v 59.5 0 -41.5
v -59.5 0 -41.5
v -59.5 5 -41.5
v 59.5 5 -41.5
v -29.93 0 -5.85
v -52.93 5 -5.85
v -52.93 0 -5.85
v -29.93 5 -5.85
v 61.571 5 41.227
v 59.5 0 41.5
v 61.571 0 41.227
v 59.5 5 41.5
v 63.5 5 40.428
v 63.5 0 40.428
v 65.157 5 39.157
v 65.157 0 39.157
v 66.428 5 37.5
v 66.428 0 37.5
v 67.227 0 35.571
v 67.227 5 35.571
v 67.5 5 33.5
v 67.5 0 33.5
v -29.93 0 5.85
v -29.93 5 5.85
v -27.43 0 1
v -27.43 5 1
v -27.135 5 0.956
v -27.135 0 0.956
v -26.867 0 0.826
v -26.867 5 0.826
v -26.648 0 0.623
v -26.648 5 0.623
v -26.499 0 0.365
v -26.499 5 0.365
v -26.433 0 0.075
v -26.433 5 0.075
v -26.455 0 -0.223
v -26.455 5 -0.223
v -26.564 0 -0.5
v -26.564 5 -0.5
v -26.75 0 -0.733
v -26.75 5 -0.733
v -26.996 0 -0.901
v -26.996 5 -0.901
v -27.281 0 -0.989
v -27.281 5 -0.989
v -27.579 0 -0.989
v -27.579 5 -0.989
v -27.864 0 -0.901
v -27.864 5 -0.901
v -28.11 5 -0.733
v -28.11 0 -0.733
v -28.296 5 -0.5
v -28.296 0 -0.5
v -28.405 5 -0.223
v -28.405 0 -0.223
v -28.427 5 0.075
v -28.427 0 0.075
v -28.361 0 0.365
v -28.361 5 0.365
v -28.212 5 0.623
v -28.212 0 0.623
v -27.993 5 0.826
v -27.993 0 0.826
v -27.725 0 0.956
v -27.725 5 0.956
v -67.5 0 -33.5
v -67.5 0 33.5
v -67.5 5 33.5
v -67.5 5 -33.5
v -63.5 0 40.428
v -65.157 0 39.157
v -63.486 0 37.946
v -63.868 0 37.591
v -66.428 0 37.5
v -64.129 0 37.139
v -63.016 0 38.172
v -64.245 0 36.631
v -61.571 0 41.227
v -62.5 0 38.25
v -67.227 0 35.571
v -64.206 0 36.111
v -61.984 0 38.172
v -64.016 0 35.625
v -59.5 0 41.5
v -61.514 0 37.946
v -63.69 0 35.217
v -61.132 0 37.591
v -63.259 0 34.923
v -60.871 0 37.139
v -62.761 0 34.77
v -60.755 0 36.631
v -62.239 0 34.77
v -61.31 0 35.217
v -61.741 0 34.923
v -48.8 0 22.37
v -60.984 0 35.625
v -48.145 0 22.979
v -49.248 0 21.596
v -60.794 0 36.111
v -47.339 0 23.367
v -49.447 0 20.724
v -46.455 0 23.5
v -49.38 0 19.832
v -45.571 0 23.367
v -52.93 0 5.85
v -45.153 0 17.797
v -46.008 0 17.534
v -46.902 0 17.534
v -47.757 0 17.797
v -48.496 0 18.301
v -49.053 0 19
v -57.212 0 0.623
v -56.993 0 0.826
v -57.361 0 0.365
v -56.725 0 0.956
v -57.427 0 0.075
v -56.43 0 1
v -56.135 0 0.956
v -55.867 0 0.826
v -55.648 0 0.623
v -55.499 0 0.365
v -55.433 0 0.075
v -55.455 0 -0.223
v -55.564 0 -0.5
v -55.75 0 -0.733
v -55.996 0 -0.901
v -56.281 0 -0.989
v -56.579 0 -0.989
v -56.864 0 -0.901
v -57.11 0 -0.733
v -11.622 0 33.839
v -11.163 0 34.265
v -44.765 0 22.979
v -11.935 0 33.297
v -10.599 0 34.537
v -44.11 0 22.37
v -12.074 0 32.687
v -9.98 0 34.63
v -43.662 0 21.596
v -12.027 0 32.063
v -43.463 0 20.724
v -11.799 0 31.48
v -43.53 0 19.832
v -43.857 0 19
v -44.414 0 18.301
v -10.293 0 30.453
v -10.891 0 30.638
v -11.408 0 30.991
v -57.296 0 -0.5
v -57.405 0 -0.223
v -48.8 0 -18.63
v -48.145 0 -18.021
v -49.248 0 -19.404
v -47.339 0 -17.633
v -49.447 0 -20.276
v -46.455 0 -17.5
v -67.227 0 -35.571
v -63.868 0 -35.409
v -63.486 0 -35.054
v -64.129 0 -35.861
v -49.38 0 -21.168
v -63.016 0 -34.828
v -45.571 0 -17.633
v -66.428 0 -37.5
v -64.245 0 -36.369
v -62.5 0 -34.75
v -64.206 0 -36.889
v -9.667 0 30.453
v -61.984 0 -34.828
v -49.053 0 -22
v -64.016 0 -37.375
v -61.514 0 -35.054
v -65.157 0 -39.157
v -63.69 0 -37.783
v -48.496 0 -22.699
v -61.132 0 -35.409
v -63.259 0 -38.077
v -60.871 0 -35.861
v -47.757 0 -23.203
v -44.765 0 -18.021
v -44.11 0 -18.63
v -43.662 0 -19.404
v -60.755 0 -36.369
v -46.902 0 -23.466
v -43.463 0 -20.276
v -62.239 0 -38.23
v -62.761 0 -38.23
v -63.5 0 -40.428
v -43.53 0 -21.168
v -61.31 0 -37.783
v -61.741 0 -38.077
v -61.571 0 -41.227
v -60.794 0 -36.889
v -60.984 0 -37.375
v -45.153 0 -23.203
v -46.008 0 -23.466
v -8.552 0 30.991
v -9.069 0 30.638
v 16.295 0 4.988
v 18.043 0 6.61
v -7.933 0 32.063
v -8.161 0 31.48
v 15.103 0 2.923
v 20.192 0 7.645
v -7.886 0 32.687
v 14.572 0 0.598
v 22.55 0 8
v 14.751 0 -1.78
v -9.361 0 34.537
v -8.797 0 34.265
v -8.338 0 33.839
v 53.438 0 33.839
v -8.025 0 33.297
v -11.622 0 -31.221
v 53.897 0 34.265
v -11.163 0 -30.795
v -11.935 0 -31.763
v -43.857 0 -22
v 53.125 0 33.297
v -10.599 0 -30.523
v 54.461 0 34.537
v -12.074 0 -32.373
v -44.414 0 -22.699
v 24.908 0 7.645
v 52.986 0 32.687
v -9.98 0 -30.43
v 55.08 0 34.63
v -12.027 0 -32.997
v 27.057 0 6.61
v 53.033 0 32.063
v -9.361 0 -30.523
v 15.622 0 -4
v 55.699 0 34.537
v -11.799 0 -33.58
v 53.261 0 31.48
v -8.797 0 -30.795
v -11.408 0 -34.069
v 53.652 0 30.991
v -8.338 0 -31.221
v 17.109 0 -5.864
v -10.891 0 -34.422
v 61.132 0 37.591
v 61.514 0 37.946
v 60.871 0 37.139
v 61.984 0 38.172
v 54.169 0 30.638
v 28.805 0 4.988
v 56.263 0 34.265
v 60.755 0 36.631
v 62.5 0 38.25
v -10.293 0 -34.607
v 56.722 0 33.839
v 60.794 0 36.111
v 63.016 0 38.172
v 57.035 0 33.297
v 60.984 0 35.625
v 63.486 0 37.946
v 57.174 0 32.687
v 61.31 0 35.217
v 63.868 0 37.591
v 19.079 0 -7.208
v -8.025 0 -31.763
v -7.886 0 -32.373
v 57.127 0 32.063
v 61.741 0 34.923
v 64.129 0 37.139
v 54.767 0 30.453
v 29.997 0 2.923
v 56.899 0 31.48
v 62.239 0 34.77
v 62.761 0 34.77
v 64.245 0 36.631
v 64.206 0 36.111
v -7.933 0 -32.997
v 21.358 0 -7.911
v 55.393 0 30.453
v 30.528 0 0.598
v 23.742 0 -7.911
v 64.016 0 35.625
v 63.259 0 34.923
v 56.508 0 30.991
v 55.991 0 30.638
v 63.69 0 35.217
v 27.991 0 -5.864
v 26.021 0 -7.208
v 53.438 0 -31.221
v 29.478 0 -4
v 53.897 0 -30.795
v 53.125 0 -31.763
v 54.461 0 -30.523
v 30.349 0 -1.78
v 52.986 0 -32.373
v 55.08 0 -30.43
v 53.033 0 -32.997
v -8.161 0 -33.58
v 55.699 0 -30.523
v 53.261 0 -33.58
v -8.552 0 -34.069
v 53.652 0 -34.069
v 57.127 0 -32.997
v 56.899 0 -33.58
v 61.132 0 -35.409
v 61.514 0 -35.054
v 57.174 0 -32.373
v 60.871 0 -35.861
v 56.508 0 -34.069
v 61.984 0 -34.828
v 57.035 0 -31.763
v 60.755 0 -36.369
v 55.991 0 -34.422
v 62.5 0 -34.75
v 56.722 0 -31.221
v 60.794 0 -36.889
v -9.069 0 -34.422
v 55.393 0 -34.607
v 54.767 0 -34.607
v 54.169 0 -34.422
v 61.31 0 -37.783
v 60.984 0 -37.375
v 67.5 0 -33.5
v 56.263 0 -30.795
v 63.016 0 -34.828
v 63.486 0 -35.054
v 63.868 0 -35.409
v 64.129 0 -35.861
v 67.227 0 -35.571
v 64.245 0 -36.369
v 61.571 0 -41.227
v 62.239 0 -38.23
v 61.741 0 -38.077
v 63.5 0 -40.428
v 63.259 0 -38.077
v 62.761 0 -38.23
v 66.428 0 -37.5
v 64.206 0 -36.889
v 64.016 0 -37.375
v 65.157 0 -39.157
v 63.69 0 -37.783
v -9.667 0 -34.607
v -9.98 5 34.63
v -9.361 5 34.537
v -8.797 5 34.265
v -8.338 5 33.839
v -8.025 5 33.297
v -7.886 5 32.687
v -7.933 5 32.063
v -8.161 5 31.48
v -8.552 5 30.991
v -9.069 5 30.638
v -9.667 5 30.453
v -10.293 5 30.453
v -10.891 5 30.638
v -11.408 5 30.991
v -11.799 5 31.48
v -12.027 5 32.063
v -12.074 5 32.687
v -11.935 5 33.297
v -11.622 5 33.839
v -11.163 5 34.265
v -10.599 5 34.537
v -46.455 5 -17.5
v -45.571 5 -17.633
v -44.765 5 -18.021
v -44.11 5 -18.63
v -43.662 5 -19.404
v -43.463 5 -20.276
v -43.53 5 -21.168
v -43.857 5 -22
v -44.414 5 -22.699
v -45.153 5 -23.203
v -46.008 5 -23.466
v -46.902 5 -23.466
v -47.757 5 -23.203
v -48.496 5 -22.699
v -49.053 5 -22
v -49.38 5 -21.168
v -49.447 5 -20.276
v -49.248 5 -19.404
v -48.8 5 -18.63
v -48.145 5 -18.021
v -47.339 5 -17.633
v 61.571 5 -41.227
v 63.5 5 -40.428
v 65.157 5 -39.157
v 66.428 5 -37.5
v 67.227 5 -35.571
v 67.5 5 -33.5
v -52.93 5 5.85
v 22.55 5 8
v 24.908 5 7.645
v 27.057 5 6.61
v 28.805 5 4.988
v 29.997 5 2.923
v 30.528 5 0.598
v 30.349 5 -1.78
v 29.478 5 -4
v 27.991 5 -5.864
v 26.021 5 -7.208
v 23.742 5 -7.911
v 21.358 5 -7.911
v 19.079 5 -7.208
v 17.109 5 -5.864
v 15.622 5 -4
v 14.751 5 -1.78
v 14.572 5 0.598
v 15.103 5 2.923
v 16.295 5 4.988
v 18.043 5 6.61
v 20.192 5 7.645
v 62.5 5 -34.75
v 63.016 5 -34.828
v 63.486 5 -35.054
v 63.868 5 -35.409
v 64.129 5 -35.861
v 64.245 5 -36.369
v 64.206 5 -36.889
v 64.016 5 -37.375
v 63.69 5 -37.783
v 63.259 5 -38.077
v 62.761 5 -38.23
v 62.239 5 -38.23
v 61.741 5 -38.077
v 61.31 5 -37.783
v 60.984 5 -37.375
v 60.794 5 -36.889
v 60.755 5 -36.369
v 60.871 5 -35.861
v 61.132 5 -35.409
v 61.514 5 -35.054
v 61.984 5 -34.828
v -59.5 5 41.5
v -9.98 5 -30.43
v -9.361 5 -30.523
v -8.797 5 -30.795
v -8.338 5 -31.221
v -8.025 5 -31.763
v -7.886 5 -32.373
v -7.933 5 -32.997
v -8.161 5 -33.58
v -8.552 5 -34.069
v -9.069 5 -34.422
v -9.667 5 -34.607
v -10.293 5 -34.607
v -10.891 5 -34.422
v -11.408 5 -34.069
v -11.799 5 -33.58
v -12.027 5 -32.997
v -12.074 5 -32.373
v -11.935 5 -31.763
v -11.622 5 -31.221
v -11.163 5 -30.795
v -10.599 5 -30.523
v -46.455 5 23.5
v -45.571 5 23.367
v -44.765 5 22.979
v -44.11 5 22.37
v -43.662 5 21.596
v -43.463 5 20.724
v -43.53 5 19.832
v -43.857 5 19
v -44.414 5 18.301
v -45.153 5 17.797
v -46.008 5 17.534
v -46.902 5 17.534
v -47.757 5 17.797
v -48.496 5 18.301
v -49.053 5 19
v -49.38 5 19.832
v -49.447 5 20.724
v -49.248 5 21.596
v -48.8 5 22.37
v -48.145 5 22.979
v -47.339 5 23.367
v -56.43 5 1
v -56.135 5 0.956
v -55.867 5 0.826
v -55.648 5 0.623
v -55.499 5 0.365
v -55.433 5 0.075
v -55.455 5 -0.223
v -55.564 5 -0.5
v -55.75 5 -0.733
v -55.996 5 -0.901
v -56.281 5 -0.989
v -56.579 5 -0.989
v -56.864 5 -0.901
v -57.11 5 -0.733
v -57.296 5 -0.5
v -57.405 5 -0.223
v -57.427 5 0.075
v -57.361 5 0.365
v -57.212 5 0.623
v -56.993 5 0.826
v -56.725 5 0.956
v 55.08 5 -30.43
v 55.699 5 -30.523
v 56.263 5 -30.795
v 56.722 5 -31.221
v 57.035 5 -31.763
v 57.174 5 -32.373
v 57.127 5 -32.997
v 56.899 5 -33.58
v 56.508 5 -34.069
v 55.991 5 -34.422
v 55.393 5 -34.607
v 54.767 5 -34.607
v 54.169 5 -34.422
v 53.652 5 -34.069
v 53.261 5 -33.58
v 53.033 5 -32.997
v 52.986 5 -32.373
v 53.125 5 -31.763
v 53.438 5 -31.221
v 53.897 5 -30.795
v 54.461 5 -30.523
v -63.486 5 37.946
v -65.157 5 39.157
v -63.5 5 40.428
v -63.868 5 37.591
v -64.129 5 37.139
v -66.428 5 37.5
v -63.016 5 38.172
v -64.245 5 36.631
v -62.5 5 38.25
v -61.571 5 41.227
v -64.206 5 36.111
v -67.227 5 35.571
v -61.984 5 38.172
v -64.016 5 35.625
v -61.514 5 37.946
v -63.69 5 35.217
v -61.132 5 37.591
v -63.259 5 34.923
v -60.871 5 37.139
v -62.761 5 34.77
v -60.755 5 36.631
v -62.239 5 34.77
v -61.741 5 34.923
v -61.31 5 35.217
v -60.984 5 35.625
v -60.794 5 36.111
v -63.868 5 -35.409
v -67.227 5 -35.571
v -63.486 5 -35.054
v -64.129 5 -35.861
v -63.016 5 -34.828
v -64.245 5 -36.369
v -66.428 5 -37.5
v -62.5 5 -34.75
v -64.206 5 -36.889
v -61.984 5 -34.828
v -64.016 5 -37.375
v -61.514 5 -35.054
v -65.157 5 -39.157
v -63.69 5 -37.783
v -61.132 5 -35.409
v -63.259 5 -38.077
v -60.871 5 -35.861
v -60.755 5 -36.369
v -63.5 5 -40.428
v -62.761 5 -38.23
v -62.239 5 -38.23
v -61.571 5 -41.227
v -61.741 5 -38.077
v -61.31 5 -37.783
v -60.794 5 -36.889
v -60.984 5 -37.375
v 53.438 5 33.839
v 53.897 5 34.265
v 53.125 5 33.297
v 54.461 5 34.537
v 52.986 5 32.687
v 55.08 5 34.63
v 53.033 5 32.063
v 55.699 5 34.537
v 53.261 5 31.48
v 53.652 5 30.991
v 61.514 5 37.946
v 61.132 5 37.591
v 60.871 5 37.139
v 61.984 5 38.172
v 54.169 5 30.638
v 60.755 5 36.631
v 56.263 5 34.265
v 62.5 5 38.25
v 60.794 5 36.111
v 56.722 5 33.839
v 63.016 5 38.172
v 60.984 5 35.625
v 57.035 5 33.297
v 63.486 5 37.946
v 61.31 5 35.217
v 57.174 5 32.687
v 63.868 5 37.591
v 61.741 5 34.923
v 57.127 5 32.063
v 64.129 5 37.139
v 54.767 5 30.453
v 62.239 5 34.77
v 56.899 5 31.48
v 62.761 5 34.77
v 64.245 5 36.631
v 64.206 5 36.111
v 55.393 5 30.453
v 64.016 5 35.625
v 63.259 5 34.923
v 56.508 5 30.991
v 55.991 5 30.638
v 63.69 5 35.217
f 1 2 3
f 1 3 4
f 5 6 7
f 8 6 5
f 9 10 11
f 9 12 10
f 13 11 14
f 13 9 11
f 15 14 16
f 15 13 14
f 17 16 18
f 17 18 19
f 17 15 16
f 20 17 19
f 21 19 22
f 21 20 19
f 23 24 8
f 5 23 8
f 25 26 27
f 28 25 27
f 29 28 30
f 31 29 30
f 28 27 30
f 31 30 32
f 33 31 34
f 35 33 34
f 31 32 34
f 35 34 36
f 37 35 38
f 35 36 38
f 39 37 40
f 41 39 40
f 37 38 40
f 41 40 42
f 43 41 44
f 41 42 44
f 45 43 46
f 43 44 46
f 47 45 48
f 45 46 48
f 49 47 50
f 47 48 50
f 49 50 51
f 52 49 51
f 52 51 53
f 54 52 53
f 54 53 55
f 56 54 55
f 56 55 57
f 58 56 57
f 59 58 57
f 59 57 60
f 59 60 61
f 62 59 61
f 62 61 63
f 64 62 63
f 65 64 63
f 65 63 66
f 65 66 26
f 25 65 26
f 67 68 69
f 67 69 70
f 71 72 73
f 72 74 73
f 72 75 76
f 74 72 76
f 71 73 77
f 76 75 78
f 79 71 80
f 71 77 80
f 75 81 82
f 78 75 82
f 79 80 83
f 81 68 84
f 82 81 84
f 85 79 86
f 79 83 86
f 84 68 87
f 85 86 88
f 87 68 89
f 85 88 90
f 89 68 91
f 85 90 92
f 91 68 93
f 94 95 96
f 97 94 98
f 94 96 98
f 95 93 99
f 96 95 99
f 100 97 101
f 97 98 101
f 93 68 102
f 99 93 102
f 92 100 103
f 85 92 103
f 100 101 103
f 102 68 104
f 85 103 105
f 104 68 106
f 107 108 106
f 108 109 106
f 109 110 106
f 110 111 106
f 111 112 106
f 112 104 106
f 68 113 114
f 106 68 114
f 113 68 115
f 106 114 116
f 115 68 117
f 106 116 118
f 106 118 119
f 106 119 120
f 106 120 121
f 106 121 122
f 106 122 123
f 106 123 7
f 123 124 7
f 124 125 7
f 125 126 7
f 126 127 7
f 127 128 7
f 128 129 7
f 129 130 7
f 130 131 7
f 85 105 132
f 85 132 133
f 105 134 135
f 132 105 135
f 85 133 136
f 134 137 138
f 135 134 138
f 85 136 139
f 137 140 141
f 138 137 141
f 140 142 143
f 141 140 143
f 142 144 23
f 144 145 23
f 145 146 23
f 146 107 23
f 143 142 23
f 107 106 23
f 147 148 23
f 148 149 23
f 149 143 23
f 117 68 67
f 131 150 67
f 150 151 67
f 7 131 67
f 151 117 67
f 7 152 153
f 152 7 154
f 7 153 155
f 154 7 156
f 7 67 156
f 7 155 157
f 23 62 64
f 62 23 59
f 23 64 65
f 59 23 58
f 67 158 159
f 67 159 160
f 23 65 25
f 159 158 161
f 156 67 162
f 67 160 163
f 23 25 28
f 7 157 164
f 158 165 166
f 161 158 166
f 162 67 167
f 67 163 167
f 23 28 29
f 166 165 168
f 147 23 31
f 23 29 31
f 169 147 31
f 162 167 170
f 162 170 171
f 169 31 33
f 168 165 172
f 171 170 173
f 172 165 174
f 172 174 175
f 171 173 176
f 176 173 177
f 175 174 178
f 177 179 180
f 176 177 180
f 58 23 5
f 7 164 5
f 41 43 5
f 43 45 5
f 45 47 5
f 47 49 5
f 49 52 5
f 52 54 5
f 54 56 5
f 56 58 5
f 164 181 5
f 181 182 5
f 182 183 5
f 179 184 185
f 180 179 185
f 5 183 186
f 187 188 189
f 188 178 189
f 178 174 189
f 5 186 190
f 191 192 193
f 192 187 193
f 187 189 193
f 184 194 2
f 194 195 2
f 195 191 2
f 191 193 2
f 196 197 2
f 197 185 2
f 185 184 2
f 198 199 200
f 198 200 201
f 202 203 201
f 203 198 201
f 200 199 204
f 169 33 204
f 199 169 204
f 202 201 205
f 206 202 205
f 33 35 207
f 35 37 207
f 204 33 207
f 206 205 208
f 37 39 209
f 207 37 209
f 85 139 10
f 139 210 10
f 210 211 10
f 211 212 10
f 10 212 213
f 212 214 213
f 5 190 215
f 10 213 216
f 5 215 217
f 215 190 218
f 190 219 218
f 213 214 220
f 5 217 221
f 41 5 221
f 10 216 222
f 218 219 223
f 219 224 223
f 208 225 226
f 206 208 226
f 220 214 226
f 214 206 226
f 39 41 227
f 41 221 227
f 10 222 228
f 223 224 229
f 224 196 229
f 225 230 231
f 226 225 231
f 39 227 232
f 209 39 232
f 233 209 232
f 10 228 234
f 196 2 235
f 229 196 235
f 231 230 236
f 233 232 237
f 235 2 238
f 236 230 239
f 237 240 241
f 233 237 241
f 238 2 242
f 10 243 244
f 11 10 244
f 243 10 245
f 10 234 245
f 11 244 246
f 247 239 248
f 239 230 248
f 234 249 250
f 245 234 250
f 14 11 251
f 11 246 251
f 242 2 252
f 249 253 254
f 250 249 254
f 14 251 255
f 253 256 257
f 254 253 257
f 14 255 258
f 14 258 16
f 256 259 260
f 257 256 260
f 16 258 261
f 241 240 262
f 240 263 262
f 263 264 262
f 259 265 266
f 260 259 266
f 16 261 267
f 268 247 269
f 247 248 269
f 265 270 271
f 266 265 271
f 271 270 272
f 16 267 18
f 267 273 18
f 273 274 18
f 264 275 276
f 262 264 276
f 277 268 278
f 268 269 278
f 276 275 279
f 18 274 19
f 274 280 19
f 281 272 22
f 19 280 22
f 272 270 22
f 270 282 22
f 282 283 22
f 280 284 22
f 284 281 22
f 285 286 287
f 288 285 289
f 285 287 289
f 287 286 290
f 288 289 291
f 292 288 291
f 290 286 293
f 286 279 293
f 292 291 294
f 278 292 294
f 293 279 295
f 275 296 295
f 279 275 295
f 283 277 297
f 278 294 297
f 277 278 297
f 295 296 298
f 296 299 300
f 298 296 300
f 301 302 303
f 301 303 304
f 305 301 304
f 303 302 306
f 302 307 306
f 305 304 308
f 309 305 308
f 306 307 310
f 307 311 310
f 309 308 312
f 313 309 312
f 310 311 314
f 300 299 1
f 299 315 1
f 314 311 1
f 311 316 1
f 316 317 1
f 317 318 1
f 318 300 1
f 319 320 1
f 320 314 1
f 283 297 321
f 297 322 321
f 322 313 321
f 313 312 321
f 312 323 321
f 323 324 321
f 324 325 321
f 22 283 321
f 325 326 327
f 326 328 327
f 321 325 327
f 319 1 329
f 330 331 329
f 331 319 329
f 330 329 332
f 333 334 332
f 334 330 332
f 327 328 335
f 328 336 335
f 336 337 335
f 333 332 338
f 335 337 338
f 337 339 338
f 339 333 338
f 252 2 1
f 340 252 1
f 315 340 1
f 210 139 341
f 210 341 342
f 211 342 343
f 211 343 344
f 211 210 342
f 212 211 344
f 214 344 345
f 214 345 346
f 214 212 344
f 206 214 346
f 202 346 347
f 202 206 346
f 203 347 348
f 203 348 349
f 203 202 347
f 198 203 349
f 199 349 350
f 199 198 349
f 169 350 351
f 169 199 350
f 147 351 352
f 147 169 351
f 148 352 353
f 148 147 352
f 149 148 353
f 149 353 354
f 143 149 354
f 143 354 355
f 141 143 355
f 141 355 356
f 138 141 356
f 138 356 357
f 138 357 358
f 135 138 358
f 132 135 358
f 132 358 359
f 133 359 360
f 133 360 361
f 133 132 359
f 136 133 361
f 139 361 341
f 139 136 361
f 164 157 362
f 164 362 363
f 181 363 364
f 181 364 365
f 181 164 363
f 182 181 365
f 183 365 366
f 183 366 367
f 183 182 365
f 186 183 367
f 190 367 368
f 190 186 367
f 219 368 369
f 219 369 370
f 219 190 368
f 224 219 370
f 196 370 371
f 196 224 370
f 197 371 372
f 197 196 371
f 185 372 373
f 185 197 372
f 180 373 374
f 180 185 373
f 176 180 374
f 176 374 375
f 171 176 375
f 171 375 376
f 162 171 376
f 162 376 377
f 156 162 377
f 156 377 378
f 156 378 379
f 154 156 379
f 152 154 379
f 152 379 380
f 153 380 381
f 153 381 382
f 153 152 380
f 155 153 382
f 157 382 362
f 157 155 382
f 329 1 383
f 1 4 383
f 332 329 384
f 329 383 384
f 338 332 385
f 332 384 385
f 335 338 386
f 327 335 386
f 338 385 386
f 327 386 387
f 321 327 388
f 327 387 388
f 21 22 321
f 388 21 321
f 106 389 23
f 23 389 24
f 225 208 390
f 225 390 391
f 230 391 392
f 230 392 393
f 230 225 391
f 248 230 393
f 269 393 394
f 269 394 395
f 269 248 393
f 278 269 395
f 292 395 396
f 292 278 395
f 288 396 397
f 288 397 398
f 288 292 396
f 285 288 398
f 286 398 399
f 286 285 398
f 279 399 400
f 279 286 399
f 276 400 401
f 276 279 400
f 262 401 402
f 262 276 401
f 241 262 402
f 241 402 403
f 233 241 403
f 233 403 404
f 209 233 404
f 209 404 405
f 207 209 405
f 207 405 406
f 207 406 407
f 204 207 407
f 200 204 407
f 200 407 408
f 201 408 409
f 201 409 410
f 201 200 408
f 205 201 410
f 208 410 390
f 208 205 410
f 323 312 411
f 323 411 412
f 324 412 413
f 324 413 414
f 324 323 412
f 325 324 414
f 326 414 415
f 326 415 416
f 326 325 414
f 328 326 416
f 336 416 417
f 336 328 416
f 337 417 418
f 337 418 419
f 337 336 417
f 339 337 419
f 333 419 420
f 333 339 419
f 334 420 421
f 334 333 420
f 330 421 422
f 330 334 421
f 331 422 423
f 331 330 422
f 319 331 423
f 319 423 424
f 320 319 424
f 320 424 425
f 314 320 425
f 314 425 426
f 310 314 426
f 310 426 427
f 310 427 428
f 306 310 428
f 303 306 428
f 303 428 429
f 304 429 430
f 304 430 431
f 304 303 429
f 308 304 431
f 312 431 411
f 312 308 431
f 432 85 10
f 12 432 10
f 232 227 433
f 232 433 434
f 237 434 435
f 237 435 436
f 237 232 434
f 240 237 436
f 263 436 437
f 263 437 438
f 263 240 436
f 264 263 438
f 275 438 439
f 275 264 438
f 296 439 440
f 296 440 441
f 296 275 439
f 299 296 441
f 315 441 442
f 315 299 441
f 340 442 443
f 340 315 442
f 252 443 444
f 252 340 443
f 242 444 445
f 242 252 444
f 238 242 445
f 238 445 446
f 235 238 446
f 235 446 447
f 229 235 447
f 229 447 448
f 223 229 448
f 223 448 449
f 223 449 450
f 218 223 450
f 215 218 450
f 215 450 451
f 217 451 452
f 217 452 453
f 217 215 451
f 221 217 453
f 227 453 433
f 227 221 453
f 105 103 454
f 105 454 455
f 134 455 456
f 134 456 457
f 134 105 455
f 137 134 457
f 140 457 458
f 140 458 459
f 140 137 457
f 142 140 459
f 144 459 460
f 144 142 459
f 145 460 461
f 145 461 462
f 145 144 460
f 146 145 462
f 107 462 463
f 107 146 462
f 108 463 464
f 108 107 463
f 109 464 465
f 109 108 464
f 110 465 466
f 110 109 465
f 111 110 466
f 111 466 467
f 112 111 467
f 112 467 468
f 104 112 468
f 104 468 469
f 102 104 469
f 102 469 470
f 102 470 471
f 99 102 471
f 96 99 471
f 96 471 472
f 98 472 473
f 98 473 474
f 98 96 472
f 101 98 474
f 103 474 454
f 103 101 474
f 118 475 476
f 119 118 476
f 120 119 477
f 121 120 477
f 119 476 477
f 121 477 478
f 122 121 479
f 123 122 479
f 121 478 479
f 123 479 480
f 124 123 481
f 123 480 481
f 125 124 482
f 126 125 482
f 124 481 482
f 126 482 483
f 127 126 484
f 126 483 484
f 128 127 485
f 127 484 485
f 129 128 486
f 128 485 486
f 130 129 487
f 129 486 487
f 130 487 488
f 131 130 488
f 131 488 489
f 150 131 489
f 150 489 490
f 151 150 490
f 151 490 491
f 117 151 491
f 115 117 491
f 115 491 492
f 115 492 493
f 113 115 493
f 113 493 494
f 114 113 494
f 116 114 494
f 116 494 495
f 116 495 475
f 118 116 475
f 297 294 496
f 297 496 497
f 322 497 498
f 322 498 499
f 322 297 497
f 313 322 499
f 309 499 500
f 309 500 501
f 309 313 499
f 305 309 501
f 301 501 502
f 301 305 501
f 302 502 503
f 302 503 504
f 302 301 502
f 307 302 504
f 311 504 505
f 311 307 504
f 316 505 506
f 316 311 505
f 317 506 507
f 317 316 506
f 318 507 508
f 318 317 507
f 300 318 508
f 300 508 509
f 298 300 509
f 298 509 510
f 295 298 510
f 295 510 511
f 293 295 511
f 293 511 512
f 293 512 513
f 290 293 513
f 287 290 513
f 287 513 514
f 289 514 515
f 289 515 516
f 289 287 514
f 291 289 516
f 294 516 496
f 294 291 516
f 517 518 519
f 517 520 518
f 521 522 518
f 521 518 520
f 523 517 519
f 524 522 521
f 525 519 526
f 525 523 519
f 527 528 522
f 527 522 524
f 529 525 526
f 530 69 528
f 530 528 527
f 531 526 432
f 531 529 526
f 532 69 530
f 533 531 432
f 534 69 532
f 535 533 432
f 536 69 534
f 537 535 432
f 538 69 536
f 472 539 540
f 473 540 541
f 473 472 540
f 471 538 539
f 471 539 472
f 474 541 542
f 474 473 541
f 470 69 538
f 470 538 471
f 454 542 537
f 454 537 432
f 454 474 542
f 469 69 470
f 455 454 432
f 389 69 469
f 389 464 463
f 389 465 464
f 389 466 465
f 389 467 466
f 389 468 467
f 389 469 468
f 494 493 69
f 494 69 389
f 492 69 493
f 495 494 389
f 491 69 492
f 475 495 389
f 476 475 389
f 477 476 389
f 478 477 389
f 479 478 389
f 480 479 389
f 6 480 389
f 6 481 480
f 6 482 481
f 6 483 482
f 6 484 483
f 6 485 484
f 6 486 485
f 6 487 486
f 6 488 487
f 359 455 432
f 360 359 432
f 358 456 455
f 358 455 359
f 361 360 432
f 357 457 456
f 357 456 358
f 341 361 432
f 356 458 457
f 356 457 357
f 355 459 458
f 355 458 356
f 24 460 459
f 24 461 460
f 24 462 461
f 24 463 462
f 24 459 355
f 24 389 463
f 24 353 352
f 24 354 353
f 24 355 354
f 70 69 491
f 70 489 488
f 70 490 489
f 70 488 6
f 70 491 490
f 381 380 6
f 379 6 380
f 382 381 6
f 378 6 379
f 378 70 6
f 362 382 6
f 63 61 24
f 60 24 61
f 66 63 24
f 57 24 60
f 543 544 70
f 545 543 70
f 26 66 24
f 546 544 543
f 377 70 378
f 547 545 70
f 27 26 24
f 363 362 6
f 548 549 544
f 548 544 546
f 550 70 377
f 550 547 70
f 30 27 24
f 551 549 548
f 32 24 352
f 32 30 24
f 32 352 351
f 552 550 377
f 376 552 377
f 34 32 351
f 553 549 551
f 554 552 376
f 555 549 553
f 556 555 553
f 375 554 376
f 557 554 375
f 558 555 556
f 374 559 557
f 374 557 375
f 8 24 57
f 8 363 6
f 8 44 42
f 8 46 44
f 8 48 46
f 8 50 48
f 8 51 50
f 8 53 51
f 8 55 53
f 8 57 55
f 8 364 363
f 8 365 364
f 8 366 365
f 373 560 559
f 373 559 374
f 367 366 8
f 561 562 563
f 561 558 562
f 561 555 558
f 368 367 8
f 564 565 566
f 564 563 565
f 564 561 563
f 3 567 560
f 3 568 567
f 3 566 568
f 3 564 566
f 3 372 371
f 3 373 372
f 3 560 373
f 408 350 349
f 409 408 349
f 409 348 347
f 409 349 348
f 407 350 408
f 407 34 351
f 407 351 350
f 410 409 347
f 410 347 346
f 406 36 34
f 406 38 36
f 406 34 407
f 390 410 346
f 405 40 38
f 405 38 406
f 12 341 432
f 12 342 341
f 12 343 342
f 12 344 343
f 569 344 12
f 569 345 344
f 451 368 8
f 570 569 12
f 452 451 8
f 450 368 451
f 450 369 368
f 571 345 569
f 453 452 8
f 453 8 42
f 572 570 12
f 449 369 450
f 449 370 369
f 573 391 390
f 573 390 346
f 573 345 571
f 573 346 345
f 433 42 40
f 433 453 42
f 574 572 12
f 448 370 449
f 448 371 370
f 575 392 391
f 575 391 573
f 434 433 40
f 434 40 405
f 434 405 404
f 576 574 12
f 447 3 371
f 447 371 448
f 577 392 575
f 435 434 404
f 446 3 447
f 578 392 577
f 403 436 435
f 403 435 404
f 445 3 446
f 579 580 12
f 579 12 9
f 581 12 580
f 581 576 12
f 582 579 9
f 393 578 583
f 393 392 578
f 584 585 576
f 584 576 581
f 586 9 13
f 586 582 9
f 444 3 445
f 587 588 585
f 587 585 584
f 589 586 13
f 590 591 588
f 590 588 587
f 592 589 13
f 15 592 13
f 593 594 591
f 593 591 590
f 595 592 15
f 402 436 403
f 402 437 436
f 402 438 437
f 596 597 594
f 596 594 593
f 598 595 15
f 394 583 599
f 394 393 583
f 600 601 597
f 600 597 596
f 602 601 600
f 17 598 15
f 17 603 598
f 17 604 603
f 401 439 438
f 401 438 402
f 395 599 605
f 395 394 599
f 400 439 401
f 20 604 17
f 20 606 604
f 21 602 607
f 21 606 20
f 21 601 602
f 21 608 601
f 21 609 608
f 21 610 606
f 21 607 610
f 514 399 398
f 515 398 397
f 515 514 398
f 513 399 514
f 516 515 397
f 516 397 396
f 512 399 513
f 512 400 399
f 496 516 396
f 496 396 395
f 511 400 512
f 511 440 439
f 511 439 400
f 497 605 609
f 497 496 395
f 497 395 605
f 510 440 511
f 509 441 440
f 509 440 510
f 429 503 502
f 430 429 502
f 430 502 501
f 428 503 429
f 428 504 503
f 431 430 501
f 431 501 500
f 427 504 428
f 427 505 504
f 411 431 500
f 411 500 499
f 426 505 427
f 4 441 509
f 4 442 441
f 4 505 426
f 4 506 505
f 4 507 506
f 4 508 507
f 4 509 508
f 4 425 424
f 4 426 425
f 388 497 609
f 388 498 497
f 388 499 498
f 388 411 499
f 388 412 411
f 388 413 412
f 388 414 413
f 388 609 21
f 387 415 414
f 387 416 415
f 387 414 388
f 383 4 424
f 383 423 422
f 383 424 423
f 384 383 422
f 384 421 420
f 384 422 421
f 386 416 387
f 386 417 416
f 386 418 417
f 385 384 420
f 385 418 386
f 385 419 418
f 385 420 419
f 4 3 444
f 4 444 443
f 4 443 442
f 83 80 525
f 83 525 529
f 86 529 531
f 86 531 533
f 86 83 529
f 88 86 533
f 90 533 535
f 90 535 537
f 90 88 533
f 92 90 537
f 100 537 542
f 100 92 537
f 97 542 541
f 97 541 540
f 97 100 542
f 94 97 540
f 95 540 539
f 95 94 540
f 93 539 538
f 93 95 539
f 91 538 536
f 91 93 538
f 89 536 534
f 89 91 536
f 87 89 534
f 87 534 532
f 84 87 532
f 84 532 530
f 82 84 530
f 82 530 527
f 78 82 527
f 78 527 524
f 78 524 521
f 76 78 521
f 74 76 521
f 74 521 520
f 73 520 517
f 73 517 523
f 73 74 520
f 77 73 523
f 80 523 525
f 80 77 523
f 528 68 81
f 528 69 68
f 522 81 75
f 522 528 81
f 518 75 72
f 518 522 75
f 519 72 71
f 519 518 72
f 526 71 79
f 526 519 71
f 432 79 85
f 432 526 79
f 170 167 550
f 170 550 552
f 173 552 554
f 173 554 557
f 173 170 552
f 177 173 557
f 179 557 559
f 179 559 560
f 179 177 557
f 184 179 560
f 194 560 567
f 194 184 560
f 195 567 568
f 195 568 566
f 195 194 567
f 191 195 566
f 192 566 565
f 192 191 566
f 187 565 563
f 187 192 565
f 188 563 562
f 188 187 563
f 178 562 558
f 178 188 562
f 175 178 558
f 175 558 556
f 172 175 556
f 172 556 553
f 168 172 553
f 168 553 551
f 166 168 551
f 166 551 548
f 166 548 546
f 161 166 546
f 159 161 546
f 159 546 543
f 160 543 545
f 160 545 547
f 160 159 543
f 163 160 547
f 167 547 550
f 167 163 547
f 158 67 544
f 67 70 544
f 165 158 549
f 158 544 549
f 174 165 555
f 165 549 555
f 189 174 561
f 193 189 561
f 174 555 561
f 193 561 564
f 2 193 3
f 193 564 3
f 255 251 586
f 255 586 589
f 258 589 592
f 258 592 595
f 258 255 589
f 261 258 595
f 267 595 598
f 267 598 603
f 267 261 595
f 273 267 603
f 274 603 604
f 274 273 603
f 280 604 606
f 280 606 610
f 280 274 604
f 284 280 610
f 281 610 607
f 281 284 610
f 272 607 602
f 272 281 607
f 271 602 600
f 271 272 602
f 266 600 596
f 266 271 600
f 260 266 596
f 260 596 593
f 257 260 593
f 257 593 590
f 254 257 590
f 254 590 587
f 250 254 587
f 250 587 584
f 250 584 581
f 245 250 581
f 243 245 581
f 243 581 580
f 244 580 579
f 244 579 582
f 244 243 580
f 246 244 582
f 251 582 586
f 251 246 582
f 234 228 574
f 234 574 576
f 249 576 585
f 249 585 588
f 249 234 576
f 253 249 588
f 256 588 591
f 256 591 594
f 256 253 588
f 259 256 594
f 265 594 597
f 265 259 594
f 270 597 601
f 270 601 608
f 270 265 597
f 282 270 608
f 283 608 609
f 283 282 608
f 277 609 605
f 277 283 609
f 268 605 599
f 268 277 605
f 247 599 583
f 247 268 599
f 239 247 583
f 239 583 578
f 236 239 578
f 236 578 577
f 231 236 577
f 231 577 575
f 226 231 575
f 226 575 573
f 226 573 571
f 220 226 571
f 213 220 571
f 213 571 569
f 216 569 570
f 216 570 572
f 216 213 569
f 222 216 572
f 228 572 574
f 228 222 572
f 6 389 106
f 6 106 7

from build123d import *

# Parameters (mm, degrees)
SKETCH1_W           = 135
SKETCH1_H           = 83
SKETCH1_R           = 2.1
SKETCH1_R_2         = 8
SKETCH1_R_3         = 3
SKETCH1_R_4         = 4.725
SKETCH1_R_5         = 1.75
BOSS_EXTRUDE1_DEPTH = 5
SKETCH3_R           = 1
SKETCH3_W           = 23
SKETCH3_H           = 11.7
CUT_EXTRUDE1_DEPTH  = 80.394584198
FILLET1_R           = 8


with BuildPart() as part:
    # Sketch1 → Boss-Extrude1 (new body)
    with BuildSketch(Plane(origin=(0, 0, 0), x_dir=(1, 0, 0), z_dir=(0, 1, 0))):
        Rectangle(SKETCH1_W, SKETCH1_H)
        with Locations(Location((-9.98, 32.53, 0), (0, 0, 270))):
            Circle(SKETCH1_R, mode=Mode.SUBTRACT)
        with Locations(Location((55.08, 32.53, 0), (0, 0, 270))):
            Circle(SKETCH1_R, mode=Mode.SUBTRACT)
        with Locations(Location((55.08, -32.53, 0), (0, 0, 270))):
            Circle(SKETCH1_R, mode=Mode.SUBTRACT)
        with Locations(Location((-9.98, -32.53, 0), (0, 0, 270))):
            Circle(SKETCH1_R, mode=Mode.SUBTRACT)
        with Locations(Location((22.55, 0, 0), (0, 0, 270))):
            Circle(SKETCH1_R_2, mode=Mode.SUBTRACT)
        with Locations(Location((-46.455, 20.5, 0), (0, 0, 270))):
            Circle(SKETCH1_R_3, mode=Mode.SUBTRACT)
        with Locations(Location((-35.78, 0, 0), (0, 0, 270))):
            Circle(SKETCH1_R_4, mode=Mode.SUBTRACT)
        with Locations(Location((-46.455, -20.5, 0), (0, 0, 270))):
            Circle(SKETCH1_R_3, mode=Mode.SUBTRACT)
        with Locations(Location((-62.5, 36.5, 0), (0, 0, 270))):
            Circle(SKETCH1_R_5, mode=Mode.SUBTRACT)
        with Locations(Location((62.5, 36.5, 0), (0, 0, 270))):
            Circle(SKETCH1_R_5, mode=Mode.SUBTRACT)
        with Locations(Location((62.5, -36.5, 0), (0, 0, 270))):
            Circle(SKETCH1_R_5, mode=Mode.SUBTRACT)
        with Locations(Location((-62.5, -36.5, 0), (0, 0, 270))):
            Circle(SKETCH1_R_5, mode=Mode.SUBTRACT)
    extrude(amount=BOSS_EXTRUDE1_DEPTH)

    # Sketch3 → Cut-Extrude1 (cut, through all)
    with BuildSketch(Plane(origin=(0, 5, 0), x_dir=(1, 0, 0), z_dir=(0, 1, 0))):
        with Locations(Location((-27.43, 0, 0), (0, 0, 270))):
            Circle(SKETCH3_R)
        with Locations(Location((-56.43, 0, 0), (0, 0, 270))):
            Circle(SKETCH3_R)
        with Locations((-41.43, 0)):
            Rectangle(SKETCH3_W, SKETCH3_H)
    extrude(amount=-CUT_EXTRUDE1_DEPTH, mode=Mode.SUBTRACT)

    # Fillet1
    fillet1_edges = [part.edges().sort_by_distance(p)[0] for p in [
        (-67.5, 2.5, -41.5),
        (67.5, 2.5, -41.5),
        (67.5, 2.5, 41.5),
        (-67.5, 2.5, 41.5),
    ]]
    fillet(fillet1_edges, radius=FILLET1_R)


solid = part.part
